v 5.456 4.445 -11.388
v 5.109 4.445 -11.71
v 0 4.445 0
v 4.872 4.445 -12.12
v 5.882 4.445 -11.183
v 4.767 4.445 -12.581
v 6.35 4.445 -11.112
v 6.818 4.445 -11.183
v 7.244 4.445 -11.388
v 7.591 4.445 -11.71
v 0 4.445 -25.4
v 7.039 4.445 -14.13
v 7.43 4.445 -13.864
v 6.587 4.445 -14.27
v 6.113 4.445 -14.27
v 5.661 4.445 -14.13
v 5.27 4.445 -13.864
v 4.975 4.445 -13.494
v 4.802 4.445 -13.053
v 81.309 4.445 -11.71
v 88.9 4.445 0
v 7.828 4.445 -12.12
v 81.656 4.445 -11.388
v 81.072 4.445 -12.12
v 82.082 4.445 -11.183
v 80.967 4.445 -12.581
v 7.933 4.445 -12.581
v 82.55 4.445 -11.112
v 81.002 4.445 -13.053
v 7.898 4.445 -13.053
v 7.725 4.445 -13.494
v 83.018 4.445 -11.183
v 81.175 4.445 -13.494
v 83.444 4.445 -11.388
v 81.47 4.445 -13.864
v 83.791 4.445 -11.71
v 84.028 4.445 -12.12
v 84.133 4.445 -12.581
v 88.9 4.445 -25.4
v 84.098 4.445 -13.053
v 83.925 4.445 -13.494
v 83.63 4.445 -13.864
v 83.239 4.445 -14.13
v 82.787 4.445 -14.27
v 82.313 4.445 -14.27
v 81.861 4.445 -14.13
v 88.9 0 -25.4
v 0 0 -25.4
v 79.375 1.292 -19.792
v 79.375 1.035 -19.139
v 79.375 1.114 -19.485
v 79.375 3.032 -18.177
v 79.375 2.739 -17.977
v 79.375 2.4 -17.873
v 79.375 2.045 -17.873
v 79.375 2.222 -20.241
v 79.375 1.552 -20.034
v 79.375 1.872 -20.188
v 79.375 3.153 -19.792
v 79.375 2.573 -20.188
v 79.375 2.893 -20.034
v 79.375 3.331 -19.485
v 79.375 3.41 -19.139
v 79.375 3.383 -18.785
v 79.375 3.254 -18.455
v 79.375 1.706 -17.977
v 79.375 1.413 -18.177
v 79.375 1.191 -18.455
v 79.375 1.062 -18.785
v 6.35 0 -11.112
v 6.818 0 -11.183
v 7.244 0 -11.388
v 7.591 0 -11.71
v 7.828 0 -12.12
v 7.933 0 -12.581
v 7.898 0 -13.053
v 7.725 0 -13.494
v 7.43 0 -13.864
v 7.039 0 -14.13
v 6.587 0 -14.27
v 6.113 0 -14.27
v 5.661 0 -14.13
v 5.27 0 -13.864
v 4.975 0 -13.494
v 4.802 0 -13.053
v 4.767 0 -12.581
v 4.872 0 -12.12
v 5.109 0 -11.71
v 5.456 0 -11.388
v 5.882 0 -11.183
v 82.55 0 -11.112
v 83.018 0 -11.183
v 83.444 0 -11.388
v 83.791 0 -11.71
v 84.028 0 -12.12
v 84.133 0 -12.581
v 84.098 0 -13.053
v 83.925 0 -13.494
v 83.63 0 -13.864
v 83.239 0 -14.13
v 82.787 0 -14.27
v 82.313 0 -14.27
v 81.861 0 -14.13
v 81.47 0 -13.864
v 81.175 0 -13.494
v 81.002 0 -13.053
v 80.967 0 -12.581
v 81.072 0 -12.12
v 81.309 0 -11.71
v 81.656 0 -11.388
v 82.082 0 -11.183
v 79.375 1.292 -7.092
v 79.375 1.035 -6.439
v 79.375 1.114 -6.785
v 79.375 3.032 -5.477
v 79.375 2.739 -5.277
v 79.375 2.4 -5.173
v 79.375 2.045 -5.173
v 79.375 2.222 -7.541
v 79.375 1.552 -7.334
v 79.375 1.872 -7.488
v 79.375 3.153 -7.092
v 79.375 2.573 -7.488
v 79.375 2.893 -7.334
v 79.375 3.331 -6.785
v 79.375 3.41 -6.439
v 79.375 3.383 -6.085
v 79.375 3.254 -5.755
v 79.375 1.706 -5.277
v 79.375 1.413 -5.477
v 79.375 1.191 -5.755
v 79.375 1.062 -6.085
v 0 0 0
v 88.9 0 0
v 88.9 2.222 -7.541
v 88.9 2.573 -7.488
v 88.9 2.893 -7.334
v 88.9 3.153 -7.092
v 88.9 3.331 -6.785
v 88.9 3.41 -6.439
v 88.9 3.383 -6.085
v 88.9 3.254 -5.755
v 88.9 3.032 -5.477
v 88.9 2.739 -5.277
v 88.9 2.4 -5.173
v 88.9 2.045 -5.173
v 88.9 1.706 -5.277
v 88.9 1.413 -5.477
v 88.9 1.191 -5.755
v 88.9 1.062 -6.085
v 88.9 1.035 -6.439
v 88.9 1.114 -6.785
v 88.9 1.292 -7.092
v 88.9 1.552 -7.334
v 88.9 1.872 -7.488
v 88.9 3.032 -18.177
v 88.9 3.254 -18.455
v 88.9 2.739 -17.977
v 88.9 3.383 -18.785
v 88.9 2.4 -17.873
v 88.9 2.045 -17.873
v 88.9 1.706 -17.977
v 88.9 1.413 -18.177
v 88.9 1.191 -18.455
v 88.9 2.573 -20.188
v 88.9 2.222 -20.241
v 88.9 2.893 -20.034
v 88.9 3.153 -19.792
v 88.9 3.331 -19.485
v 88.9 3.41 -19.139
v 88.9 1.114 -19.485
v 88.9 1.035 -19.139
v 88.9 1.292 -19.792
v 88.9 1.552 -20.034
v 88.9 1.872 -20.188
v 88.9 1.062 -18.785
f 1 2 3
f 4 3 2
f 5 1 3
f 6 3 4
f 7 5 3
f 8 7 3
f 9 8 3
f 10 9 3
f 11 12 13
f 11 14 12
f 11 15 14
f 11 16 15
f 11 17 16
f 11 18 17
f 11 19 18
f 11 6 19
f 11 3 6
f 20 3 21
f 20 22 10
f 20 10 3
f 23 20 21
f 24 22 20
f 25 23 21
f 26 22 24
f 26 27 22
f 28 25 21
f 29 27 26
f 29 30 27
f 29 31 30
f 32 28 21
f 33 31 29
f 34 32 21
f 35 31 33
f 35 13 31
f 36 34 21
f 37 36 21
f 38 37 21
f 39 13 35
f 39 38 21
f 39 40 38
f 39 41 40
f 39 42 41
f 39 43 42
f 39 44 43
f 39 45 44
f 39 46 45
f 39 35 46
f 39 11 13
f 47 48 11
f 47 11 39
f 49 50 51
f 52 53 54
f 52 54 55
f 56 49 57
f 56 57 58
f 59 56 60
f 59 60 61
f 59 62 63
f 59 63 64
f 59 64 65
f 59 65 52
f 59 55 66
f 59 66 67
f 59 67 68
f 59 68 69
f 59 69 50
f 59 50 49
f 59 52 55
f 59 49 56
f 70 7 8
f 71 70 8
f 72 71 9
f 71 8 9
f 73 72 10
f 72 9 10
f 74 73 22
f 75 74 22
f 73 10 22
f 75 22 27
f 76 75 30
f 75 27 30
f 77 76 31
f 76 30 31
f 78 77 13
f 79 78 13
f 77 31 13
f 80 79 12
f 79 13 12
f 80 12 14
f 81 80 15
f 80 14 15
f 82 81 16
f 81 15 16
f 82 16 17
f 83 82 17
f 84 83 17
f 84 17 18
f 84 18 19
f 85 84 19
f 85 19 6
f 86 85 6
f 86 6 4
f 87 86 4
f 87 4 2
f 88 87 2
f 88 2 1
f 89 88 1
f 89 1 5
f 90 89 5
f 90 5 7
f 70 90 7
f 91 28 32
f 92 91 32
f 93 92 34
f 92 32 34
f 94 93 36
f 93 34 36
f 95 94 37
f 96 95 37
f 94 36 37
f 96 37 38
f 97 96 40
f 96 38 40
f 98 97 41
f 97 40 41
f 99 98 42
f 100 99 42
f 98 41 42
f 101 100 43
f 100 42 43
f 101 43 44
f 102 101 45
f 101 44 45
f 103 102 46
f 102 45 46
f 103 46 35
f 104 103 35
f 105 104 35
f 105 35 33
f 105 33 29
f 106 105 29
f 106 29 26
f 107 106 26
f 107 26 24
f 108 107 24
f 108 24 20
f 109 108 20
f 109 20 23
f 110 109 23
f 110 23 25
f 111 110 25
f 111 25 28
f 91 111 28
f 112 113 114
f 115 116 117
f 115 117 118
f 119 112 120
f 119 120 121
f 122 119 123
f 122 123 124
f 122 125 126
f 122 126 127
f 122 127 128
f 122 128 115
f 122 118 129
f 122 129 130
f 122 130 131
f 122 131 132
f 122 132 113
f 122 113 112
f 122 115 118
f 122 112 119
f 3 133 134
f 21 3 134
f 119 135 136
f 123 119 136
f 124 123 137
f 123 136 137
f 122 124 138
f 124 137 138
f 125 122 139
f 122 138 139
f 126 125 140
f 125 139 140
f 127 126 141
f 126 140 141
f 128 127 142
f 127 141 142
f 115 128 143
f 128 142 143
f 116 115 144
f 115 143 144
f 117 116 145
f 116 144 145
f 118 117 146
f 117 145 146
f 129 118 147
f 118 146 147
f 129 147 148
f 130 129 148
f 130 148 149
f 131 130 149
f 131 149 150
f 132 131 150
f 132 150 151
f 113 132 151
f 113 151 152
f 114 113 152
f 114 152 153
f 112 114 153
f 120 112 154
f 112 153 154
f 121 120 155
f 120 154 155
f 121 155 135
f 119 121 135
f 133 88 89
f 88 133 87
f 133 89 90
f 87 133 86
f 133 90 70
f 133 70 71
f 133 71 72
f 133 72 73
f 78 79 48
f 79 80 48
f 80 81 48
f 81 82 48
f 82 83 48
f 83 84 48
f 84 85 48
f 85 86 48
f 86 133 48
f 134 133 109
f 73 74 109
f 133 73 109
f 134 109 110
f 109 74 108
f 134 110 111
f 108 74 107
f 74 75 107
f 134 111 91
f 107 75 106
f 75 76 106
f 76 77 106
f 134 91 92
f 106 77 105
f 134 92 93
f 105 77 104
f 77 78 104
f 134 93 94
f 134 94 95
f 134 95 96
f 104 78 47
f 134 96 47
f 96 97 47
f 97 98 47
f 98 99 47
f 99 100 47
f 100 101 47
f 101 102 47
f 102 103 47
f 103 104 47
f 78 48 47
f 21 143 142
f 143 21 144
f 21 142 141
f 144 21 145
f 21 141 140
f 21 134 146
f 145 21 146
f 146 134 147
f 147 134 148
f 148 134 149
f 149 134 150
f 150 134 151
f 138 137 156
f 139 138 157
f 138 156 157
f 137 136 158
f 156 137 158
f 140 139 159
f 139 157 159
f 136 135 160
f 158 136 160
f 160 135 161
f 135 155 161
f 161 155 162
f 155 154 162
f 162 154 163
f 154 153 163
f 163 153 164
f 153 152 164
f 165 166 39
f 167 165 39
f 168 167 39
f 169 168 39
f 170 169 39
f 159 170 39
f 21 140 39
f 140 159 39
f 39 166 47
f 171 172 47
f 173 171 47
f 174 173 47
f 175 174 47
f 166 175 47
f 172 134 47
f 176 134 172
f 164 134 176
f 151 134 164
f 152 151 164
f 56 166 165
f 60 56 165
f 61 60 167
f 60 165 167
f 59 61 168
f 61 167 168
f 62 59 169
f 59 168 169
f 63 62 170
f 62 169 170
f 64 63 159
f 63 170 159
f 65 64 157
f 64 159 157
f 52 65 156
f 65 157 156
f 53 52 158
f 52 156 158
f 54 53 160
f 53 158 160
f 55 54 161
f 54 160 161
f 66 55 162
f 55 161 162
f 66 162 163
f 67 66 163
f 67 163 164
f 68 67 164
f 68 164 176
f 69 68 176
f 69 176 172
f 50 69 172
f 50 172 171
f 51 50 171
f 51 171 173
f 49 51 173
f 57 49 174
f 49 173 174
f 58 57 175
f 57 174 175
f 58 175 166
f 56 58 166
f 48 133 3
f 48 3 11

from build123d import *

# Parameters (mm, degrees)
SKETCH1_W           = 88.9
SKETCH1_H           = 25.4
BOSS_EXTRUDE1_DEPTH = 4.445
SKETCH3_R           = 1.190625
CUT_EXTRUDE2_DEPTH  = 9.525
SKETCH4_R           = 1.5875
CUT_EXTRUDE3_DEPTH  = 93.564183273


with BuildPart() as part:
    # Sketch1 → Boss-Extrude1 (new body)
    with BuildSketch(Plane(origin=(0, 0, 0), x_dir=(1, 0, 0), z_dir=(0, 1, 0))):
        with Locations((44.45, 12.7)):
            Rectangle(SKETCH1_W, SKETCH1_H)
    extrude(amount=BOSS_EXTRUDE1_DEPTH)

    # Sketch3 → Cut-Extrude2 (cut)
    with BuildSketch(Plane(origin=(88.9, 0, 0), x_dir=(0, 0, -1), z_dir=(1, 0, 0))):
        with Locations((19.05, 2.2225)):
            Circle(SKETCH3_R)
        with Locations((6.35, 2.2225)):
            Circle(SKETCH3_R)
    extrude(amount=-CUT_EXTRUDE2_DEPTH, mode=Mode.SUBTRACT)

    # Sketch4 → Cut-Extrude3 (cut, through all)
    with BuildSketch(Plane(origin=(0, 4.445, 0), x_dir=(1, 0, 0), z_dir=(0, 1, 0))):
        with Locations(Location((6.35, 12.7, 0), (0, 0, 270))):
            Circle(SKETCH4_R)
        with Locations(Location((82.55, 12.7, 0), (0, 0, 270))):
            Circle(SKETCH4_R)
    extrude(amount=-CUT_EXTRUDE3_DEPTH, mode=Mode.SUBTRACT)


solid = part.part
